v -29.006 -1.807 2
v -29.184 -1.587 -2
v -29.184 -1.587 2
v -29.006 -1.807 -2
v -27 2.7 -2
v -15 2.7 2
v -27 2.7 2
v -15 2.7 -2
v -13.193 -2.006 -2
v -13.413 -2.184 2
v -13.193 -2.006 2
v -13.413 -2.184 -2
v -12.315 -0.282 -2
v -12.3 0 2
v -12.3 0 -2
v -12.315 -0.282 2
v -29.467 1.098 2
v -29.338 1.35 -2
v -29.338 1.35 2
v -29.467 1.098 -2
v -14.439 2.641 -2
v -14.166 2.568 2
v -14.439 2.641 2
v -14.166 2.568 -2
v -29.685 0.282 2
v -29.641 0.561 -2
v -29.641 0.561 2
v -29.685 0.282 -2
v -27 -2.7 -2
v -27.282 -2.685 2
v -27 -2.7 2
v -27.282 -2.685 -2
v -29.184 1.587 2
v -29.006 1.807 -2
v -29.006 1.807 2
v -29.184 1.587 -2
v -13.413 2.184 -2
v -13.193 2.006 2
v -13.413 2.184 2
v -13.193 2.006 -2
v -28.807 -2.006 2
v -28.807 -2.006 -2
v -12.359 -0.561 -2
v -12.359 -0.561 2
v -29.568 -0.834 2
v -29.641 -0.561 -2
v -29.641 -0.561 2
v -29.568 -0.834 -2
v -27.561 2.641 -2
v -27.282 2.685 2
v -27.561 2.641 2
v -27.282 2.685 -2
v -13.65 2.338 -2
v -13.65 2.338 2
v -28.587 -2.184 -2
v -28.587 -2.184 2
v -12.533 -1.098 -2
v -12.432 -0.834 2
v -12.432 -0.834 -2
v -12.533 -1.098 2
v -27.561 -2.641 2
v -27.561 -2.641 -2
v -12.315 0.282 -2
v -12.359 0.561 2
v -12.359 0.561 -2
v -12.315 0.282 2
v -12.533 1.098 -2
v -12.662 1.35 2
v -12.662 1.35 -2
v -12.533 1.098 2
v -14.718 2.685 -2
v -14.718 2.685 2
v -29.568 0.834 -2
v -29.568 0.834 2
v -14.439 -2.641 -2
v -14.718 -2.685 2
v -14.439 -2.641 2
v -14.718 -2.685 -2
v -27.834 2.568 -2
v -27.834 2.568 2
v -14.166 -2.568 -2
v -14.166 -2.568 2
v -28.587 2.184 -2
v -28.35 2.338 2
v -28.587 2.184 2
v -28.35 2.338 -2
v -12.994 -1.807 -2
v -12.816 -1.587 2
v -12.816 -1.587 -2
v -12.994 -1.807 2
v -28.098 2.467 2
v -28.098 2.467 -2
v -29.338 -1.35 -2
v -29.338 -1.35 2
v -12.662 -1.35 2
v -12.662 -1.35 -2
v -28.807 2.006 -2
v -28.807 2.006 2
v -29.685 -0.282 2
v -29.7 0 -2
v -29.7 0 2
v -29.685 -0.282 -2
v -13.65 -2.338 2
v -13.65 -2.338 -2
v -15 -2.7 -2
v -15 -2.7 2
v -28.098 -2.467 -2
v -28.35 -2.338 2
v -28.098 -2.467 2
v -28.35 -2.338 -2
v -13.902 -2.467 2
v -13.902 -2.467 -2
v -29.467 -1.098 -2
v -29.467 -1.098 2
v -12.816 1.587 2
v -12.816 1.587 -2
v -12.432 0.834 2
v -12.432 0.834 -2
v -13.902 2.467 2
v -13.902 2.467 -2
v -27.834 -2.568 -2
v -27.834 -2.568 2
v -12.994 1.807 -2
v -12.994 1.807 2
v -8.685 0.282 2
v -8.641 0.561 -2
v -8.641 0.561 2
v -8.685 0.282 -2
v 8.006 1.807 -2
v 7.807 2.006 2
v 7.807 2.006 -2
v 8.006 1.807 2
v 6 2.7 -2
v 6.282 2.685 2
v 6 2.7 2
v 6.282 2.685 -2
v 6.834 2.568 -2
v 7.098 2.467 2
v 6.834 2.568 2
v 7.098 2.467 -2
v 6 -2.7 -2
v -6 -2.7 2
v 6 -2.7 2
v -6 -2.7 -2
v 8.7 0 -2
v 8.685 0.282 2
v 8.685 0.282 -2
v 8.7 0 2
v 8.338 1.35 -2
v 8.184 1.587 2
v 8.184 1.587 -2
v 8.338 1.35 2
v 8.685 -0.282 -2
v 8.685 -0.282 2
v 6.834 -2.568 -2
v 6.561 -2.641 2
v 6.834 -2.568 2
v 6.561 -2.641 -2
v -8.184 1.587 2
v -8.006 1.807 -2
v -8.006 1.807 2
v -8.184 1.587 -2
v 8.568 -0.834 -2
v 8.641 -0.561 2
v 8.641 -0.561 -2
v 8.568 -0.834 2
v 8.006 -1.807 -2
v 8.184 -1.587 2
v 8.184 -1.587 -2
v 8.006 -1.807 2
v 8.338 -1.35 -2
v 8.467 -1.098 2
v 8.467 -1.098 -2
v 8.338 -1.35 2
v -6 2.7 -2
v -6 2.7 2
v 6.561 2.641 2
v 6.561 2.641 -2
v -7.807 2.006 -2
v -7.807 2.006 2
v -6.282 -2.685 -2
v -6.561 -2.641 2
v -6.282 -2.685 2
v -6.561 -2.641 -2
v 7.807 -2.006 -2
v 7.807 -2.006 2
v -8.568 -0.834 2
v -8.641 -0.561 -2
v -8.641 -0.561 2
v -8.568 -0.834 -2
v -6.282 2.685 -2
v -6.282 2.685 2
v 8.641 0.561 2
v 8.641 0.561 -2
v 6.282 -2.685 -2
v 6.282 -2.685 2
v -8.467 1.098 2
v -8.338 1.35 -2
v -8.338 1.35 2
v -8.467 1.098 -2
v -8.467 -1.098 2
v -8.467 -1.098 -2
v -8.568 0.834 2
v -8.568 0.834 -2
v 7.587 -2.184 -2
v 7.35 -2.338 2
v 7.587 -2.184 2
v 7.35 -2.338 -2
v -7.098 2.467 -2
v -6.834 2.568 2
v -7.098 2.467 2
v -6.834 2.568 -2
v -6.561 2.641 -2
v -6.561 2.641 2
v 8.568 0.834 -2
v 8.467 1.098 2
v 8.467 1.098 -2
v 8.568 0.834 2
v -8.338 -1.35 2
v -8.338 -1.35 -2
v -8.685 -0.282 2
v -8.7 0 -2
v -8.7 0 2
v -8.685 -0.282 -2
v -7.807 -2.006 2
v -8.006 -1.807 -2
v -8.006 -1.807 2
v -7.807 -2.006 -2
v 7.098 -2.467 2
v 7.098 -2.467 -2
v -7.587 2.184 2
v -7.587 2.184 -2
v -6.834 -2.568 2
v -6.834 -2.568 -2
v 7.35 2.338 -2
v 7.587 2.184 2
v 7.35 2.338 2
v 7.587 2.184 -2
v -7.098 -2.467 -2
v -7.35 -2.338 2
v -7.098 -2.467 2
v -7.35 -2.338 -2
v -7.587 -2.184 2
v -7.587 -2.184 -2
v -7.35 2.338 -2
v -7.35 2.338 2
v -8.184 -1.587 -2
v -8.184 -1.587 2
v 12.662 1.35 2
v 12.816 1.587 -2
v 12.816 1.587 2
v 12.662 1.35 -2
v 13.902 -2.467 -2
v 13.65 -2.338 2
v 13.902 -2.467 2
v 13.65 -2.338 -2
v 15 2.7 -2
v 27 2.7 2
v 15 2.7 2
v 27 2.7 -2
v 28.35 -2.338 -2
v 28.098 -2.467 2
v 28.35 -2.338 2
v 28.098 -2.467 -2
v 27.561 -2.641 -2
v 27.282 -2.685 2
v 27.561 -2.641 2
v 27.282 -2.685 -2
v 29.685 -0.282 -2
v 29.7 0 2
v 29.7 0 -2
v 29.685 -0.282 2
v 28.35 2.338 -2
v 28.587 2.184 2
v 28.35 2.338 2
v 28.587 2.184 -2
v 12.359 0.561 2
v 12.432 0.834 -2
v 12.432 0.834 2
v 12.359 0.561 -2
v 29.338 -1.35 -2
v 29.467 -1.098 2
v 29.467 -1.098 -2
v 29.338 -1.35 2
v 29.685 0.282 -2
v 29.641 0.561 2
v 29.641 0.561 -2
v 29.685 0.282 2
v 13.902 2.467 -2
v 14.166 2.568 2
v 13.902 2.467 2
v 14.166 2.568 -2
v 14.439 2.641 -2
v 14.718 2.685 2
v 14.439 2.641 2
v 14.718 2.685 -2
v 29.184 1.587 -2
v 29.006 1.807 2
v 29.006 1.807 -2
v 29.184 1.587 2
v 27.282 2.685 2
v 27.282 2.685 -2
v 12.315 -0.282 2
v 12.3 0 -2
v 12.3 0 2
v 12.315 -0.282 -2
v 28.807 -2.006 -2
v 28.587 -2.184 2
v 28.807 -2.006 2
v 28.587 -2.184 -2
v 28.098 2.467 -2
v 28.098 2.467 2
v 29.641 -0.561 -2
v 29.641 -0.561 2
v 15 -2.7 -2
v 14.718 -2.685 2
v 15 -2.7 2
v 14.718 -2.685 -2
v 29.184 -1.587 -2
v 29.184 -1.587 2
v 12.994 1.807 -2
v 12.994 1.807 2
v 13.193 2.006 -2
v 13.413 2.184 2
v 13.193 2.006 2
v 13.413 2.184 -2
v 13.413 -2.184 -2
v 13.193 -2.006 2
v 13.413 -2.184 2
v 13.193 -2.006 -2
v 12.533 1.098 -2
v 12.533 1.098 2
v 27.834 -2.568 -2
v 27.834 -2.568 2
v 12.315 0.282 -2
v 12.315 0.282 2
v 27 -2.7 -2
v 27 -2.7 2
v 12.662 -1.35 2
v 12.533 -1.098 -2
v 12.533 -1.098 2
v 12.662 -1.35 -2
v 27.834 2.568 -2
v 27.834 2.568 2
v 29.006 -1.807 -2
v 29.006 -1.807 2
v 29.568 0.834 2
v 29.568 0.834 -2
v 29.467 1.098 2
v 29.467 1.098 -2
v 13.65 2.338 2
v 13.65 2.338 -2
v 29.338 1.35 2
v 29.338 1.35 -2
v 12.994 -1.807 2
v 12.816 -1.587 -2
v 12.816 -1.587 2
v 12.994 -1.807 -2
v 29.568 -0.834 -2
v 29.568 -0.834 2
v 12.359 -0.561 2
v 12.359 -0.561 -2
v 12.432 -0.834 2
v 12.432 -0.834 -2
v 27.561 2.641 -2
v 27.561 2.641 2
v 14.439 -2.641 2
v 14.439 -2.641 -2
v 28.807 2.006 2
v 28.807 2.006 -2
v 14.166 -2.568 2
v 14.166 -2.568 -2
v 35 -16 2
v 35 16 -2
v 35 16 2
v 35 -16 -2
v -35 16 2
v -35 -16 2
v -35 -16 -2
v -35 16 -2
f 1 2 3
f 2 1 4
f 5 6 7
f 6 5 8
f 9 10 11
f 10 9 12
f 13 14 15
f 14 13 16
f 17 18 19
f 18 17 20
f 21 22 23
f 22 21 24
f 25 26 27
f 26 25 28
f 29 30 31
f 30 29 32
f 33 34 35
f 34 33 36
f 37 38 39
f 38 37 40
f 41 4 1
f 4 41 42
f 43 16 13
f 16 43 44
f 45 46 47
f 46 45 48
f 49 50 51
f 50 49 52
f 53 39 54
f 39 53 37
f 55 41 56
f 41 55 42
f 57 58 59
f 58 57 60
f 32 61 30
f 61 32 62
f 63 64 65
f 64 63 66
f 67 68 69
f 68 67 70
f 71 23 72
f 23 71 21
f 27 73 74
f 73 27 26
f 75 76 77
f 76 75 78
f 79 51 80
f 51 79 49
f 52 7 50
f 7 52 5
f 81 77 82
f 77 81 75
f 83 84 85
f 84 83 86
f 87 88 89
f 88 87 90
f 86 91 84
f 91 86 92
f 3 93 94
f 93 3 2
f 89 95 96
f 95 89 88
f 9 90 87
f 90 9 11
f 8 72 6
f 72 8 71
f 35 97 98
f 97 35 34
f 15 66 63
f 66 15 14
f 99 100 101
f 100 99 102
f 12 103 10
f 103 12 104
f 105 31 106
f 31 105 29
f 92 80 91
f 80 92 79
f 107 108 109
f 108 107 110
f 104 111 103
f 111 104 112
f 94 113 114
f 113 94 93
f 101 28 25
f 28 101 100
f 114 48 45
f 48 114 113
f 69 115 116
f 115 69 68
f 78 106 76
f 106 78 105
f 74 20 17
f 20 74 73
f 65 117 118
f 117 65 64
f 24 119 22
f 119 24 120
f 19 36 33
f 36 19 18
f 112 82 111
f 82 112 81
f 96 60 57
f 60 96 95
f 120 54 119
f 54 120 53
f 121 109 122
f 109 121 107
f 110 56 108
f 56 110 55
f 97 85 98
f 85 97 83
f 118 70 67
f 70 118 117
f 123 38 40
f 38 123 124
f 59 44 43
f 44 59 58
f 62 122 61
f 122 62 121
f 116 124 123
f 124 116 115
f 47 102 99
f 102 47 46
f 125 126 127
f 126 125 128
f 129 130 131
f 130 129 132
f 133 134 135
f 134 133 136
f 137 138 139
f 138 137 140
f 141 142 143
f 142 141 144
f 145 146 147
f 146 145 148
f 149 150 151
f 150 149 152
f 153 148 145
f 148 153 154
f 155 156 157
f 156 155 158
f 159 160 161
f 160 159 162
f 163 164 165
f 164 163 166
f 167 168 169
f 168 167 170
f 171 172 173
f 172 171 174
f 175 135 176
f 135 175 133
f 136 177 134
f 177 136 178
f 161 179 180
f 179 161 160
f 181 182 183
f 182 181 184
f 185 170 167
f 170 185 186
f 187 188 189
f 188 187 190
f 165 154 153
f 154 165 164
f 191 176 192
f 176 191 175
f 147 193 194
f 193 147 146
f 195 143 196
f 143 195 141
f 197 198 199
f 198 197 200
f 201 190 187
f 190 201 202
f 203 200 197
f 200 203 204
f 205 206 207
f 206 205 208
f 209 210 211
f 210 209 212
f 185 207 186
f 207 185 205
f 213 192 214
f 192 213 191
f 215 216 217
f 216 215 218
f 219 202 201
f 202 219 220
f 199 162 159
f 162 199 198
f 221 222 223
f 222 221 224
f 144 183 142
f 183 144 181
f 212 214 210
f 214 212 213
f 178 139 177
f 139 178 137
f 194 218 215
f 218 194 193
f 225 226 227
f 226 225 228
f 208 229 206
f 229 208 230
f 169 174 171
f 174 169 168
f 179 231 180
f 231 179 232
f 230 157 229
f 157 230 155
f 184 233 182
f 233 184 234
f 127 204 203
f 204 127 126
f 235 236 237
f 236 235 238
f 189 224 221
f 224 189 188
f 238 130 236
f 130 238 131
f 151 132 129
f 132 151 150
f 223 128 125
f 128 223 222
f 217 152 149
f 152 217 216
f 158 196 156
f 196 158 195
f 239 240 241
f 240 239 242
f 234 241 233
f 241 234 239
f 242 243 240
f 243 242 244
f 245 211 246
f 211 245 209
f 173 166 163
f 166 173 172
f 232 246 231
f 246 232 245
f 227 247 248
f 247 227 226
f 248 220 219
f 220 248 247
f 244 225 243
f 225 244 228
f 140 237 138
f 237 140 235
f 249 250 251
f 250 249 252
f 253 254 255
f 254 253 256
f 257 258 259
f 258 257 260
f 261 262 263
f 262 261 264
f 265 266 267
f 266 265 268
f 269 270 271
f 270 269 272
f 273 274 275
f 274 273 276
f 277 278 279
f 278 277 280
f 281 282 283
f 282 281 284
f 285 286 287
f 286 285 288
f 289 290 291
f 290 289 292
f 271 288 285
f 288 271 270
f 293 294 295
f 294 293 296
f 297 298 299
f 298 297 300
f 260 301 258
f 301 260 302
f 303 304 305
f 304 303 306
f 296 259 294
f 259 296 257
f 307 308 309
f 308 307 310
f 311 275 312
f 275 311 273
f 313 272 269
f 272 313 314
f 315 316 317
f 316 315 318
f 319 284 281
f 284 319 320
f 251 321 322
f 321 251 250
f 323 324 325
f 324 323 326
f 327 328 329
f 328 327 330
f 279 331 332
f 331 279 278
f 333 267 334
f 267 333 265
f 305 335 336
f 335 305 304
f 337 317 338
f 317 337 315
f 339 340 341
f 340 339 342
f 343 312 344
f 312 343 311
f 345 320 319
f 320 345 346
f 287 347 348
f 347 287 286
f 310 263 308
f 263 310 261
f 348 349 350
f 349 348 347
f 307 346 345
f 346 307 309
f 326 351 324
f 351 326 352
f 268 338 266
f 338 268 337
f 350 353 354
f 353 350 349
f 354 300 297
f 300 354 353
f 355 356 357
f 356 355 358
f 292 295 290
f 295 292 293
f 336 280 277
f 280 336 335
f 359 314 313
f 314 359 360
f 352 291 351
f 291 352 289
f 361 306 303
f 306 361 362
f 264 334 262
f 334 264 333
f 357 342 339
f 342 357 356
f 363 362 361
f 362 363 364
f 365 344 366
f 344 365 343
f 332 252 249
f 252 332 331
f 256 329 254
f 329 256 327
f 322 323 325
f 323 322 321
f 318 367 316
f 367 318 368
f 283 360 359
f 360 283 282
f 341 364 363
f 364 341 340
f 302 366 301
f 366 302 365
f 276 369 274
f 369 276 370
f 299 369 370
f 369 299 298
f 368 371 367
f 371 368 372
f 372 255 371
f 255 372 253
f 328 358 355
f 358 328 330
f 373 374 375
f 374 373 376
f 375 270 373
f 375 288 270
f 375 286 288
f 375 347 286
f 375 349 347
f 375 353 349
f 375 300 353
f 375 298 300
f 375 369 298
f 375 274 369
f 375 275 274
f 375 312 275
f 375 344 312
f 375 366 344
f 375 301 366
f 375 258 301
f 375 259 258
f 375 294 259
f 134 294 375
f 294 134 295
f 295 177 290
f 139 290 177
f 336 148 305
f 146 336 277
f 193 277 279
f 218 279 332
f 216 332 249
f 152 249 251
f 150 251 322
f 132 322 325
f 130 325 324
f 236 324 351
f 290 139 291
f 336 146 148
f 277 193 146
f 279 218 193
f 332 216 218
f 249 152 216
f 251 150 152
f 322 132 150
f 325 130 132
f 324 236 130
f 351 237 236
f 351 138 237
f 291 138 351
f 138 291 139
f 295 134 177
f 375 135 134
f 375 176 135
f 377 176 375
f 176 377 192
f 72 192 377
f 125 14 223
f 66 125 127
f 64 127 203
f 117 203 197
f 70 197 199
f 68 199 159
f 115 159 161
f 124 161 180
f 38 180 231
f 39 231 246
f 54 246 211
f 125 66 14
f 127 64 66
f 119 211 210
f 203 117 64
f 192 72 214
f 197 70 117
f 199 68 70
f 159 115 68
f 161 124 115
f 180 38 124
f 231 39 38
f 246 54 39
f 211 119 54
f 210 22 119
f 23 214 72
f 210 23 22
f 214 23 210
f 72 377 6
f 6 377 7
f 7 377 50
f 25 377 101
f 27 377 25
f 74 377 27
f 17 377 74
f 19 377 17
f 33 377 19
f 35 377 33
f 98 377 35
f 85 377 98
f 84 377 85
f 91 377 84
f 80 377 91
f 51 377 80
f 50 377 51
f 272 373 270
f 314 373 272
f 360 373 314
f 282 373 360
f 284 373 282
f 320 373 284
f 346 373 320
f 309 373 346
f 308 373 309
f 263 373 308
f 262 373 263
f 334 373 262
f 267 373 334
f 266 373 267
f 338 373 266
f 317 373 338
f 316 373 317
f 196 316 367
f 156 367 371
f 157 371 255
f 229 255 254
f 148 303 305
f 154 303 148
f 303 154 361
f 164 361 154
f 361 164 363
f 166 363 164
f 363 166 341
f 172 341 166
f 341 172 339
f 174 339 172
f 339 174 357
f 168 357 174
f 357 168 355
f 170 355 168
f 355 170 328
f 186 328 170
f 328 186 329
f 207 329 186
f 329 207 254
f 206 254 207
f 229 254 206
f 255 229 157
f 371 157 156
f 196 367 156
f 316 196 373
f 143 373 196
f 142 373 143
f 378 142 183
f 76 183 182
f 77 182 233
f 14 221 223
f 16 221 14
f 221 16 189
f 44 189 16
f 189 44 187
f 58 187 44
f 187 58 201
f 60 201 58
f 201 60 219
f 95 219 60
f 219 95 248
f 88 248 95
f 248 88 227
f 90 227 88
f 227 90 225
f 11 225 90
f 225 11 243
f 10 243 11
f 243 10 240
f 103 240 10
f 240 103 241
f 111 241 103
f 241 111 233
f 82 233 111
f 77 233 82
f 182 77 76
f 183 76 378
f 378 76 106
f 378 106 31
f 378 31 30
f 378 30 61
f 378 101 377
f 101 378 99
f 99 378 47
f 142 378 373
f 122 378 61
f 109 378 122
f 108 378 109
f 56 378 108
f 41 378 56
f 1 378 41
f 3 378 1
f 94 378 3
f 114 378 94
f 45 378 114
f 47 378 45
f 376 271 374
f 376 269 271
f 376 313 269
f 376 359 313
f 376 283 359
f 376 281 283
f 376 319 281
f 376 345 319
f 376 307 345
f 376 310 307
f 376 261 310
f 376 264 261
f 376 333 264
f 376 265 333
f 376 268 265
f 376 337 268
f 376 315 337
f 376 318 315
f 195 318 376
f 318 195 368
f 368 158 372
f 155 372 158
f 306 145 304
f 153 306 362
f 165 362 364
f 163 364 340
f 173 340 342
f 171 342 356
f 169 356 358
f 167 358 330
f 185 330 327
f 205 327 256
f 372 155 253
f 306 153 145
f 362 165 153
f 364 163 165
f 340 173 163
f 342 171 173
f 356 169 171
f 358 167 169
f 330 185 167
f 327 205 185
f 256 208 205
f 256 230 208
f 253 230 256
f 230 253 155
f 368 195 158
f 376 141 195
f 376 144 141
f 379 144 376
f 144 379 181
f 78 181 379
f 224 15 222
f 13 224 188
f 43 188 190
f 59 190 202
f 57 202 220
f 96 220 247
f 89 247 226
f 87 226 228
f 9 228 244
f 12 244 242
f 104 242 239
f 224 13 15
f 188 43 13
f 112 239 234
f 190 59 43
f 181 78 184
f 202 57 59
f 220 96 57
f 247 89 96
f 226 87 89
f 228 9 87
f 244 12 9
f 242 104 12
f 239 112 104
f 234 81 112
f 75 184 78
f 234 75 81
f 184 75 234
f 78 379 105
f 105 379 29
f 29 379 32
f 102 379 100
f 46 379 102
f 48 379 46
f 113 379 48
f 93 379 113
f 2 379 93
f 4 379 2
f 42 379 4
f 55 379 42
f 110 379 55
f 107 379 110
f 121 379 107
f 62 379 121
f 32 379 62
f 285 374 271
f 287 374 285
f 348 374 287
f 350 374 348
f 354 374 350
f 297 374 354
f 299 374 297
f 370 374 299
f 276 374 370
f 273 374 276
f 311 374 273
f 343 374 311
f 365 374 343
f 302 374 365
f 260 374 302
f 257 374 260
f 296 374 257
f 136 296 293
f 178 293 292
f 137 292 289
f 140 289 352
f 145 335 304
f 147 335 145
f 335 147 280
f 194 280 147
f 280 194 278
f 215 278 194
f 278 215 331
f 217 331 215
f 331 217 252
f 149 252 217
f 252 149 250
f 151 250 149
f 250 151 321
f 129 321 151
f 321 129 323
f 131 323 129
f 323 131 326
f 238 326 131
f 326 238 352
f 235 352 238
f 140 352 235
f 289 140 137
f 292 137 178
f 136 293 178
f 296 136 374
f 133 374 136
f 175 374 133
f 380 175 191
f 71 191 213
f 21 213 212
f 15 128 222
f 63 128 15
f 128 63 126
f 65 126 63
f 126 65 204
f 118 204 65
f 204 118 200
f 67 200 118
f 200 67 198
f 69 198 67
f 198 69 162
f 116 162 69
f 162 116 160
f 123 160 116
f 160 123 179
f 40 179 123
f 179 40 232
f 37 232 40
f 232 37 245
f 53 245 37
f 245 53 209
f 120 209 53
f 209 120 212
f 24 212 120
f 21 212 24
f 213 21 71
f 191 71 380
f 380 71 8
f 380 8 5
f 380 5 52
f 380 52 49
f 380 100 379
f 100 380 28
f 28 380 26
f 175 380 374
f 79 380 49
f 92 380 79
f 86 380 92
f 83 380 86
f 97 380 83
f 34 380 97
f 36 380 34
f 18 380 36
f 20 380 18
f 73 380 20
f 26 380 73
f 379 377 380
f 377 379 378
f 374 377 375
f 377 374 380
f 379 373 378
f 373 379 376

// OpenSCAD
// Slotted mounting plate.
$fn = 60;
eps = 0.02;
plate_l = 70;
plate_w = 32;
plate_t = 4;
slot_l = 12;
slot_d = 5.4;
module slot(x) { hull() { translate([x-slot_l/2,0,-plate_t/2-eps]) cylinder(d=slot_d,h=plate_t+2*eps); translate([x+slot_l/2,0,-plate_t/2-eps]) cylinder(d=slot_d,h=plate_t+2*eps); } }
difference() { cube([plate_l, plate_w, plate_t], center=true); for (i=[0:2]) slot(-plate_l/2+14+i*(plate_l-28)/max(1,2)); }
